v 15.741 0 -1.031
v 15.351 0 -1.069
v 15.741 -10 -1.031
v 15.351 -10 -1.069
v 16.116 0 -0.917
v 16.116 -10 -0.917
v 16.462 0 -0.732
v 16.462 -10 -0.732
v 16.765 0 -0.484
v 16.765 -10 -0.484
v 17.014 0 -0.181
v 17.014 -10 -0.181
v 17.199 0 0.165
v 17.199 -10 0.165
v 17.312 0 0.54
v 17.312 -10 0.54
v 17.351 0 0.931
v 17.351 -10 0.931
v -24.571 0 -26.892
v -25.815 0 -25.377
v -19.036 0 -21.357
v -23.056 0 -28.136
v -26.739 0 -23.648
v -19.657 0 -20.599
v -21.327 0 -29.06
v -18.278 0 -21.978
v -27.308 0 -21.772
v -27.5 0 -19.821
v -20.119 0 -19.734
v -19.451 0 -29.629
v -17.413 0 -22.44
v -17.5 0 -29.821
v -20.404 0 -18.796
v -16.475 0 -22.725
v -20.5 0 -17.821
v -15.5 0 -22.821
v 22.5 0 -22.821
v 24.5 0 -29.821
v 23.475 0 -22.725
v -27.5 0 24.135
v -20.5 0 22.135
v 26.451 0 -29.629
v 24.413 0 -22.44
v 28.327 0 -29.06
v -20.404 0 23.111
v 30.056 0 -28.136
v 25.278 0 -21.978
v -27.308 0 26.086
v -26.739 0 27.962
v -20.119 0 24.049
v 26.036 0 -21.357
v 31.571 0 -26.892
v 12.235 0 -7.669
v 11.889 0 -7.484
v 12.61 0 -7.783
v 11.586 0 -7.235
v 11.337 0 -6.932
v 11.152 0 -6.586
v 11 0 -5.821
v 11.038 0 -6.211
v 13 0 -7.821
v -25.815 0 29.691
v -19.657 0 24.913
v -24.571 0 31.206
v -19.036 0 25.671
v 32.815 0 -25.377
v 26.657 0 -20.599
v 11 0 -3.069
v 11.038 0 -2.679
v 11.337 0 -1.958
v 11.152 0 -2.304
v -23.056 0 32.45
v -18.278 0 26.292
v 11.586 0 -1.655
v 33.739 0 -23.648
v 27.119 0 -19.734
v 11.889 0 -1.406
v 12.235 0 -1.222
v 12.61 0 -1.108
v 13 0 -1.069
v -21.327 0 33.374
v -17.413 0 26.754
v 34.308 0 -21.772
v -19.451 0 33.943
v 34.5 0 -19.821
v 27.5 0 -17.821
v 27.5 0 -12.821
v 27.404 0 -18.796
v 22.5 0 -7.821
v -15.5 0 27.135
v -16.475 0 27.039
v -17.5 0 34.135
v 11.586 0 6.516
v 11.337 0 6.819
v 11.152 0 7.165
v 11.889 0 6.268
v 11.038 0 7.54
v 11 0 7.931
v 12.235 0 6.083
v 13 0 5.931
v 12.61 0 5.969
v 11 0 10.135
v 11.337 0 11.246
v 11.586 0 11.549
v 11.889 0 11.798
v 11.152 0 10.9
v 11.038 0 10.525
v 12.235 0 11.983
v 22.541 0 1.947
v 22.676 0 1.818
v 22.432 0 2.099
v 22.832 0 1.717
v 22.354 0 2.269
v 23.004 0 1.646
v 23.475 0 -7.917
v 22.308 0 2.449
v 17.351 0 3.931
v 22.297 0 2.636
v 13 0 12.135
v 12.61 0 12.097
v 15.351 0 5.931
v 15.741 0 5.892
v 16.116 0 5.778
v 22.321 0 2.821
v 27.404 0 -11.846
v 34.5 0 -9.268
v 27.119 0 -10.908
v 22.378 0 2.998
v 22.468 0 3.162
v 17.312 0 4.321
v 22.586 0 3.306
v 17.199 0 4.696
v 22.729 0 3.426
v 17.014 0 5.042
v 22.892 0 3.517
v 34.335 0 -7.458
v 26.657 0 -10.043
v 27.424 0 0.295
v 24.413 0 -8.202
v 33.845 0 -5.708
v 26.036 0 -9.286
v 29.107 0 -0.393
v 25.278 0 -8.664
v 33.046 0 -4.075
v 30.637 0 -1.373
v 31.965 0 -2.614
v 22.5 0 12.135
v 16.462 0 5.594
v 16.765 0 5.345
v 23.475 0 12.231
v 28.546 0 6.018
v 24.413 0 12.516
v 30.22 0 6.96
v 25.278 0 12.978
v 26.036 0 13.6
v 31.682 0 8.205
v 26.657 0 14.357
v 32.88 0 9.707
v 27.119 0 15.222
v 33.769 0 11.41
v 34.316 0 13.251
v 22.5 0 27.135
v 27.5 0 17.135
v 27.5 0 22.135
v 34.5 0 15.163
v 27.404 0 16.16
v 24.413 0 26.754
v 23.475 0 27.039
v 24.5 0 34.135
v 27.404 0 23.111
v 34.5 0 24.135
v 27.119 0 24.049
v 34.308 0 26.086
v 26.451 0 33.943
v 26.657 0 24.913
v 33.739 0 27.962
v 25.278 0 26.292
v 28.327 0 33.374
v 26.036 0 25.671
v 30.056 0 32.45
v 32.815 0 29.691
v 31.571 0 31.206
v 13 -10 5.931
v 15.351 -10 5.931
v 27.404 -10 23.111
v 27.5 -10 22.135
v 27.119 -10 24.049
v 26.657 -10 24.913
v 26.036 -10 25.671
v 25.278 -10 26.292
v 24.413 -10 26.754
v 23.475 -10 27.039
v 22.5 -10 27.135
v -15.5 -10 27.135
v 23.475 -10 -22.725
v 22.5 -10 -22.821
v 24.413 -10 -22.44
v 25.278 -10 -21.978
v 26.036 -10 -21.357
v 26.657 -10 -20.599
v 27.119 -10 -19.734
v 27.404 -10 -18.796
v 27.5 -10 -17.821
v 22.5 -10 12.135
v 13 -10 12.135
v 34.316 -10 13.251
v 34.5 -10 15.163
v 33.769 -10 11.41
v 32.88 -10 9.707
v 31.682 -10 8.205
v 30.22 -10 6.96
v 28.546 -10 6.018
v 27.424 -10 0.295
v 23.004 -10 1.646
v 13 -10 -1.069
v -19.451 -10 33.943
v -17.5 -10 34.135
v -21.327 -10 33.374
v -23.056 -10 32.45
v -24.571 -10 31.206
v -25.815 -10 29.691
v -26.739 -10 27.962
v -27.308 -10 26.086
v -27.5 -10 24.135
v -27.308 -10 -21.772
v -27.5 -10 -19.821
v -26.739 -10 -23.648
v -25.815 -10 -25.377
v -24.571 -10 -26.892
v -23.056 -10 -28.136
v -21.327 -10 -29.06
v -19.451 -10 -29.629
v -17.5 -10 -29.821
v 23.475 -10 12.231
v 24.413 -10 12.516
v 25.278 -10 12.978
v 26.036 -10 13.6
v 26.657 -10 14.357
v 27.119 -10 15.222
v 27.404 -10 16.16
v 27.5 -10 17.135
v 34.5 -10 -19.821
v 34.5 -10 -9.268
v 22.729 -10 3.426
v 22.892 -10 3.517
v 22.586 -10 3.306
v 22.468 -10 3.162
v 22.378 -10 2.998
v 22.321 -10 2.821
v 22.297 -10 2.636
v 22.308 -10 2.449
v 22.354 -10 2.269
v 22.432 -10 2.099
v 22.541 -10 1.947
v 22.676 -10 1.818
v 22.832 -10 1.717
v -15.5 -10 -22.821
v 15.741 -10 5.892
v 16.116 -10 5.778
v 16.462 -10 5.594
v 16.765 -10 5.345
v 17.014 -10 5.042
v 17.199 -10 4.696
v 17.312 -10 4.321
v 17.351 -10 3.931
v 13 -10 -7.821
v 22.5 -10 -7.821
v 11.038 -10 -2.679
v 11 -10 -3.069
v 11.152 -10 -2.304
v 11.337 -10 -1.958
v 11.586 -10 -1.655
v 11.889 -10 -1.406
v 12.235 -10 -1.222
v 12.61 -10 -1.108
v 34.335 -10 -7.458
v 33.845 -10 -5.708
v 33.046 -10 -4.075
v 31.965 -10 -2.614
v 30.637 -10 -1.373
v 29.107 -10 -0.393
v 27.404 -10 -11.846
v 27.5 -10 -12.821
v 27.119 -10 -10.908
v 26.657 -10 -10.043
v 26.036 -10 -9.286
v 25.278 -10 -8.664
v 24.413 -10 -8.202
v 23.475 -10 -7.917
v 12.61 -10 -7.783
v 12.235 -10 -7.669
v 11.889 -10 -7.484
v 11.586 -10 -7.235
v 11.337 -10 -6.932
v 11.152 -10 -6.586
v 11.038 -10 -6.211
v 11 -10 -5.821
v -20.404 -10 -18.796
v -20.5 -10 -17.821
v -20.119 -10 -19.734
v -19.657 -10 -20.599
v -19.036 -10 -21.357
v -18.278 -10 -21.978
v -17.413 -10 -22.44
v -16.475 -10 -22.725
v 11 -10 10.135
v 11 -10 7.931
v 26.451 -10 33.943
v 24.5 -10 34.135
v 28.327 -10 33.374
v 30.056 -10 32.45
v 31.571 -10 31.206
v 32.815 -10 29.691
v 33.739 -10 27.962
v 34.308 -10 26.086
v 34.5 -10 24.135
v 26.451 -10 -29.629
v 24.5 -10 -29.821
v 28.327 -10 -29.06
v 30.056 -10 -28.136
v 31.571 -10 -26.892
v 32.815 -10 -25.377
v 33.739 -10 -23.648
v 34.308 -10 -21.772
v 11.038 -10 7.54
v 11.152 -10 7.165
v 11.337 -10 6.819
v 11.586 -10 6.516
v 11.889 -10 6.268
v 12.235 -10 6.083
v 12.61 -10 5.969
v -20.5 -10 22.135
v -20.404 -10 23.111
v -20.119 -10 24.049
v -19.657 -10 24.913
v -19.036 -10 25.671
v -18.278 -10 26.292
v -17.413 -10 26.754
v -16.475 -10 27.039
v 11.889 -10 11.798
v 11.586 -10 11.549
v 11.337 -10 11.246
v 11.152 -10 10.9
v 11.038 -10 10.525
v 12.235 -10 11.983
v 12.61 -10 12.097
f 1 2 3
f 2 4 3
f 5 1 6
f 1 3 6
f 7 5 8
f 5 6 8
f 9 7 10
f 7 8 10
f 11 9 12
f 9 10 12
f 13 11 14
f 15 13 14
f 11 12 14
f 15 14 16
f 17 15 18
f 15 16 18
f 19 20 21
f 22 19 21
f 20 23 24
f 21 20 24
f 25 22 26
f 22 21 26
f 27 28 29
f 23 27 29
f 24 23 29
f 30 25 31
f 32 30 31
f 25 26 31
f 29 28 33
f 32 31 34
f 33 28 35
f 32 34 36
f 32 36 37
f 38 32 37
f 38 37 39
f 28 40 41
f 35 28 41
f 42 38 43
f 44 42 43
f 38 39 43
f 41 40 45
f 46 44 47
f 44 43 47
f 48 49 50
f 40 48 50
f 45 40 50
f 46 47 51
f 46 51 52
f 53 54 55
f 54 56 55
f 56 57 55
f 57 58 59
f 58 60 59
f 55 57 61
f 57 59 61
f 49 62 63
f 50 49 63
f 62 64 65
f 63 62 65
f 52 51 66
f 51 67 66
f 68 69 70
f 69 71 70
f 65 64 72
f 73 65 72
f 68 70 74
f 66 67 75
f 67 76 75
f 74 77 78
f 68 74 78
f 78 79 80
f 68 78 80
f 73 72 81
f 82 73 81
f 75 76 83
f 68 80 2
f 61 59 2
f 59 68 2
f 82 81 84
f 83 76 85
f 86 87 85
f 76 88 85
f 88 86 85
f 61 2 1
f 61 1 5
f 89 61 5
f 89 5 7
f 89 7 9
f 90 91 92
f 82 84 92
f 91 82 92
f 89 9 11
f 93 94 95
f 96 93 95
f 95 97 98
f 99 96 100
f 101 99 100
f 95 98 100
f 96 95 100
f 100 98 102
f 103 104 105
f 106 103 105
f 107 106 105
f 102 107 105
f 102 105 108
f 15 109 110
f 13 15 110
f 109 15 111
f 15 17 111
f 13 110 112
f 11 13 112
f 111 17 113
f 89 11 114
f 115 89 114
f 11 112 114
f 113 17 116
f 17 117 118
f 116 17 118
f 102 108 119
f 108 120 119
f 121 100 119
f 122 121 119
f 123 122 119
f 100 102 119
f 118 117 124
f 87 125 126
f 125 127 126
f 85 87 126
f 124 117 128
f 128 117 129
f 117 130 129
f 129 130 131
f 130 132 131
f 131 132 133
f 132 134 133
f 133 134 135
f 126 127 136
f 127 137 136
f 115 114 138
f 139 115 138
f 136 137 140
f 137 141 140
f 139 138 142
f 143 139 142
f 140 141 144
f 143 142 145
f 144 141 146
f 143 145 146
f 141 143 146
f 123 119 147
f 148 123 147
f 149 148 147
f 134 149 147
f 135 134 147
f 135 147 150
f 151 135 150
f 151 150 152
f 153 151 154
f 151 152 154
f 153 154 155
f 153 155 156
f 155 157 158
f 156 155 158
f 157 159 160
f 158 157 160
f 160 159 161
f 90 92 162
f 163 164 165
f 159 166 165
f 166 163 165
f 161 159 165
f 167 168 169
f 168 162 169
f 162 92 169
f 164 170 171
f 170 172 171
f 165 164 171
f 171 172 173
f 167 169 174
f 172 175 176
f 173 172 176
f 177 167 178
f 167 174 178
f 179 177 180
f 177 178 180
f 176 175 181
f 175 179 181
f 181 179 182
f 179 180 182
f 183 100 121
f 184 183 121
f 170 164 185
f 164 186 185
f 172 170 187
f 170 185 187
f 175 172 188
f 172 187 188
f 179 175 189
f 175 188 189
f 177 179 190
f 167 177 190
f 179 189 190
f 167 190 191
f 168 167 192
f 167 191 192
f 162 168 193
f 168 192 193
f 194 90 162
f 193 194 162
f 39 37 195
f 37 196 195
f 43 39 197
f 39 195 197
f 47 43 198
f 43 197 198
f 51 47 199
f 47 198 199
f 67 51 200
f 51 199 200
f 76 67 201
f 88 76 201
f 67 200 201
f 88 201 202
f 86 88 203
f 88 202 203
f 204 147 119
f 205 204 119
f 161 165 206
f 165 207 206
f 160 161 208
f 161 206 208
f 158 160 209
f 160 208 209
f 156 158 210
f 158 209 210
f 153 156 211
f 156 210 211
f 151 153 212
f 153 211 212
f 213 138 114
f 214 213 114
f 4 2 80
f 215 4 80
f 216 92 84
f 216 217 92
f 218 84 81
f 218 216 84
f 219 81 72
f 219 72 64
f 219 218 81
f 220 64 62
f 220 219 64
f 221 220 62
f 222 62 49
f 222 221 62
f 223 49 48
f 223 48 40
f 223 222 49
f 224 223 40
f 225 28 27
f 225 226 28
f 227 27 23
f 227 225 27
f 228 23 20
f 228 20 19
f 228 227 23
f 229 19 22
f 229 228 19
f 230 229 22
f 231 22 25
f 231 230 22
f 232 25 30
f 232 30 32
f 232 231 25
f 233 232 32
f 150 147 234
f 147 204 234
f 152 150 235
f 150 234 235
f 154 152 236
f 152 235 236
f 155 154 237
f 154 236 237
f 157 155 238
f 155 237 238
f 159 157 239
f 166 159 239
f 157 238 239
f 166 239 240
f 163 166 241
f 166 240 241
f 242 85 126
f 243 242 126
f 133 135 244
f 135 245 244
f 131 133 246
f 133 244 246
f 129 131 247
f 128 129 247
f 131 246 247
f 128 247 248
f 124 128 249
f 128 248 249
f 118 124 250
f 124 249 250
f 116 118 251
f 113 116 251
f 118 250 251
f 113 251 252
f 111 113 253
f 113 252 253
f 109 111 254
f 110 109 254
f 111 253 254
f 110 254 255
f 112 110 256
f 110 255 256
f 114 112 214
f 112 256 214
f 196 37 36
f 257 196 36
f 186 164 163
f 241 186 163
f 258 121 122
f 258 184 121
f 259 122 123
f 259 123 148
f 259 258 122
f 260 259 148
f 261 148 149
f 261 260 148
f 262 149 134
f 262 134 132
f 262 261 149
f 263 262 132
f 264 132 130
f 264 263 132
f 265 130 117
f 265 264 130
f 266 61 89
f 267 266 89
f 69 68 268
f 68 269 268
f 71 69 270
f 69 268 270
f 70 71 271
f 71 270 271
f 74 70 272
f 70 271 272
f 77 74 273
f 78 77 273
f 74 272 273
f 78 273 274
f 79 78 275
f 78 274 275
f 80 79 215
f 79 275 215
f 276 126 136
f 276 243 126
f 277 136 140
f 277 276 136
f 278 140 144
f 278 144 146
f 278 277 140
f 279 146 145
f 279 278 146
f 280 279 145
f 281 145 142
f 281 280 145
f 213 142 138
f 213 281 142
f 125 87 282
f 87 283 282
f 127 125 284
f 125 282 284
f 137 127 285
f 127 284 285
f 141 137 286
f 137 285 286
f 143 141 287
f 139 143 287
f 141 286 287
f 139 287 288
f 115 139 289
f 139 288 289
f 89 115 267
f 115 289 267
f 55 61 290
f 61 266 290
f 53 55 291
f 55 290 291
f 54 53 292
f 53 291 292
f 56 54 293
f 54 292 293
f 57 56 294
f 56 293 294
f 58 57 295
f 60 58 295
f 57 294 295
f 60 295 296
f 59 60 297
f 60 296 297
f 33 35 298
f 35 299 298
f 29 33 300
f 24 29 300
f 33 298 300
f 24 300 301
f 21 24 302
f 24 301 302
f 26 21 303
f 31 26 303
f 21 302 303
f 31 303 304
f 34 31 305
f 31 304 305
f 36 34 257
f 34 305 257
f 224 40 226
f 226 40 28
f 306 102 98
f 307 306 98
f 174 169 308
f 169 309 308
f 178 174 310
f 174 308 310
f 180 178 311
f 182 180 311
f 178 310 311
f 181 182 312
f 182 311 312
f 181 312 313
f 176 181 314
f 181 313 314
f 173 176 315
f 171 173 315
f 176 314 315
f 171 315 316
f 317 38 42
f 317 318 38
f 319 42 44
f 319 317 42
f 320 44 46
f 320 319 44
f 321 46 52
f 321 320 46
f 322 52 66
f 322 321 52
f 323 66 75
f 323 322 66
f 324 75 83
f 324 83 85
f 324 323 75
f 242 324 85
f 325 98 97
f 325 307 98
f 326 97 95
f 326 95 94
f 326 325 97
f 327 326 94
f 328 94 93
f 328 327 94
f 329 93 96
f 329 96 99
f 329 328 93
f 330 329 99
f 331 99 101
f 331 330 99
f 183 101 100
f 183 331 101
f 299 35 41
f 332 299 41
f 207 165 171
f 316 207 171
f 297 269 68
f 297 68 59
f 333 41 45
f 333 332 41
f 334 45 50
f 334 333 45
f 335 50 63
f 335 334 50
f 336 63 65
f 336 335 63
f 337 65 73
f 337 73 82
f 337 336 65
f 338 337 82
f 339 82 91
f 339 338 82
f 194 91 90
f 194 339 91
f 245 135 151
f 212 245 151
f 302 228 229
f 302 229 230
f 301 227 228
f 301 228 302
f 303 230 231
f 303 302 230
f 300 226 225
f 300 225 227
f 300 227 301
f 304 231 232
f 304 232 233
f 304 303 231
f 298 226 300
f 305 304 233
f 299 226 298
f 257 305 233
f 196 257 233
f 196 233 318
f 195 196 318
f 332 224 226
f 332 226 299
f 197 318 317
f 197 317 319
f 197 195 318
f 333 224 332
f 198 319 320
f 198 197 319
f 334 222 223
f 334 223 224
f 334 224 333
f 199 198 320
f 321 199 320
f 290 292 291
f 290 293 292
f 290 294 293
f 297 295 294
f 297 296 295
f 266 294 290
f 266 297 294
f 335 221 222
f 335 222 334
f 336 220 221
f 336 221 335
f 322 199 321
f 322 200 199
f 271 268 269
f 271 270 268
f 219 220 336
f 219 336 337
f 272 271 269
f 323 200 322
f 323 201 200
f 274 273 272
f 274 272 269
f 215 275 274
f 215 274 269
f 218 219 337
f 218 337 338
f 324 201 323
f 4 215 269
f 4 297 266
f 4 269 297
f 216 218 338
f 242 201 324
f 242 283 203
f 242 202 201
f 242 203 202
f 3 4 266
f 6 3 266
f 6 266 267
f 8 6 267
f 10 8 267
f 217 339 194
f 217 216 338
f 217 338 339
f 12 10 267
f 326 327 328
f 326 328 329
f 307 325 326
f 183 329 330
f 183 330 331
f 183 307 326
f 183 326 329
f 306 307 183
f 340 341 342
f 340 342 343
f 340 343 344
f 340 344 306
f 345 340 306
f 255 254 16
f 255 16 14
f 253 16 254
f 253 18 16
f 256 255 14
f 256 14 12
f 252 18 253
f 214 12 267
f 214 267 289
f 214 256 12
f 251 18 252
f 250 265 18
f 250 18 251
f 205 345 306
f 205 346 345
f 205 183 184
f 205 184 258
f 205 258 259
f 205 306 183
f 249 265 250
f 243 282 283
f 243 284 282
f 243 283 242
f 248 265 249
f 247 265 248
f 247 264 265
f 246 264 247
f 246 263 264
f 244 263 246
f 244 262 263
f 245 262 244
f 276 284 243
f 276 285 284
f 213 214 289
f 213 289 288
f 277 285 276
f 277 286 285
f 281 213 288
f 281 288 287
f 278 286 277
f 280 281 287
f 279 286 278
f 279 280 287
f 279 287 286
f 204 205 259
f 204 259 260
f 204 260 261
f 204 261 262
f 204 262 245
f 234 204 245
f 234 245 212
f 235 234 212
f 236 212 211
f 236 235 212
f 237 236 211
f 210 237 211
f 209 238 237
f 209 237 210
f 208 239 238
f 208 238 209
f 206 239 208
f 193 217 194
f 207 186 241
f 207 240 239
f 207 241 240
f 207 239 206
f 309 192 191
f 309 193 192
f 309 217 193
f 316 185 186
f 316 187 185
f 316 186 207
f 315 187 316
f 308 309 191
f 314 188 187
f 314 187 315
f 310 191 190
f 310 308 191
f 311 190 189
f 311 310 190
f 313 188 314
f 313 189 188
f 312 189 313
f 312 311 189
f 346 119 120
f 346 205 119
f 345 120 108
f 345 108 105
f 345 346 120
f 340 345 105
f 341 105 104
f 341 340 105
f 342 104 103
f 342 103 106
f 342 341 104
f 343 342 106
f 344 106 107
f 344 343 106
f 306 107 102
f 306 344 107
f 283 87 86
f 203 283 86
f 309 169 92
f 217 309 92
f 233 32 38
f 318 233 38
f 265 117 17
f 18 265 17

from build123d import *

# Parameters (mm, degrees)
F1_DEPTH = 10
F2_R     = 5
F3_R     = 2
F4_R     = 10
F5_R     = 1
F6_R     = 10


with BuildPart() as f1:
    # F0 (on Front) → F1 (new body)
    with BuildSketch(Plane.XZ):
        Polygon((-27.5, 34.135083), (-27.5, -29.821047), (34.5, -29.821047), (34.5, -1.869009), (20.437485, 2.430633), (34.5, 8.652056), (34.5, 34.135083), align=None)
        Polygon((-20.5, 27.135083), (27.5, 27.135083), (27.5, 12.135083), (11, 12.135083), (11, 5.930633), (17.350806, 5.930633), (17.350806, -1.069367), (11, -1.069367), (11, -7.821047), (27.5, -7.821047), (27.5, -22.821047), (-20.5, -22.821047), align=None, mode=Mode.SUBTRACT)
    extrude(amount=F1_DEPTH)

    # F2
    f2_edges = [f1.edges().sort_by_distance(p)[0] for p in [
        (-20.5, -5, 27.135083),
        (27.5, -5, 27.135083),
        (27.5, -5, 12.135083),
        (-20.5, -5, -22.821047),
        (27.5, -5, -22.821047),
        (27.5, -5, -7.821047),
    ]]
    fillet(f2_edges, radius=F2_R)

    # F3
    f3_edges = [f1.edges().sort_by_distance(p)[0] for p in [
        (11, -5, 12.135083),
        (11, -5, 5.930633),
        (17.350806, -5, 5.930633),
        (17.350806, -5, -1.069367),
        (11, -5, -1.069367),
        (11, -5, -7.821047),
    ]]
    fillet(f3_edges, radius=F3_R)

    # F4
    f4_edges = [f1.edges().sort_by_distance(p)[0] for p in [
        (34.5, -5, 34.135083),
        (34.5, -5, 8.652056),
        (34.5, -5, -1.869009),
        (34.5, -5, -29.821047),
    ]]
    fillet(f4_edges, radius=F4_R)

    # F5
    f5_edges = [f1.edges().sort_by_distance(p)[0] for p in [
        (20.437485, -5, 2.430633),
    ]]
    fillet(f5_edges, radius=F5_R)

    # F6
    f6_edges = [f1.edges().sort_by_distance(p)[0] for p in [
        (-27.5, -5, 34.135083),
        (-27.5, -5, -29.821047),
    ]]
    fillet(f6_edges, radius=F6_R)


solid = f1.part
